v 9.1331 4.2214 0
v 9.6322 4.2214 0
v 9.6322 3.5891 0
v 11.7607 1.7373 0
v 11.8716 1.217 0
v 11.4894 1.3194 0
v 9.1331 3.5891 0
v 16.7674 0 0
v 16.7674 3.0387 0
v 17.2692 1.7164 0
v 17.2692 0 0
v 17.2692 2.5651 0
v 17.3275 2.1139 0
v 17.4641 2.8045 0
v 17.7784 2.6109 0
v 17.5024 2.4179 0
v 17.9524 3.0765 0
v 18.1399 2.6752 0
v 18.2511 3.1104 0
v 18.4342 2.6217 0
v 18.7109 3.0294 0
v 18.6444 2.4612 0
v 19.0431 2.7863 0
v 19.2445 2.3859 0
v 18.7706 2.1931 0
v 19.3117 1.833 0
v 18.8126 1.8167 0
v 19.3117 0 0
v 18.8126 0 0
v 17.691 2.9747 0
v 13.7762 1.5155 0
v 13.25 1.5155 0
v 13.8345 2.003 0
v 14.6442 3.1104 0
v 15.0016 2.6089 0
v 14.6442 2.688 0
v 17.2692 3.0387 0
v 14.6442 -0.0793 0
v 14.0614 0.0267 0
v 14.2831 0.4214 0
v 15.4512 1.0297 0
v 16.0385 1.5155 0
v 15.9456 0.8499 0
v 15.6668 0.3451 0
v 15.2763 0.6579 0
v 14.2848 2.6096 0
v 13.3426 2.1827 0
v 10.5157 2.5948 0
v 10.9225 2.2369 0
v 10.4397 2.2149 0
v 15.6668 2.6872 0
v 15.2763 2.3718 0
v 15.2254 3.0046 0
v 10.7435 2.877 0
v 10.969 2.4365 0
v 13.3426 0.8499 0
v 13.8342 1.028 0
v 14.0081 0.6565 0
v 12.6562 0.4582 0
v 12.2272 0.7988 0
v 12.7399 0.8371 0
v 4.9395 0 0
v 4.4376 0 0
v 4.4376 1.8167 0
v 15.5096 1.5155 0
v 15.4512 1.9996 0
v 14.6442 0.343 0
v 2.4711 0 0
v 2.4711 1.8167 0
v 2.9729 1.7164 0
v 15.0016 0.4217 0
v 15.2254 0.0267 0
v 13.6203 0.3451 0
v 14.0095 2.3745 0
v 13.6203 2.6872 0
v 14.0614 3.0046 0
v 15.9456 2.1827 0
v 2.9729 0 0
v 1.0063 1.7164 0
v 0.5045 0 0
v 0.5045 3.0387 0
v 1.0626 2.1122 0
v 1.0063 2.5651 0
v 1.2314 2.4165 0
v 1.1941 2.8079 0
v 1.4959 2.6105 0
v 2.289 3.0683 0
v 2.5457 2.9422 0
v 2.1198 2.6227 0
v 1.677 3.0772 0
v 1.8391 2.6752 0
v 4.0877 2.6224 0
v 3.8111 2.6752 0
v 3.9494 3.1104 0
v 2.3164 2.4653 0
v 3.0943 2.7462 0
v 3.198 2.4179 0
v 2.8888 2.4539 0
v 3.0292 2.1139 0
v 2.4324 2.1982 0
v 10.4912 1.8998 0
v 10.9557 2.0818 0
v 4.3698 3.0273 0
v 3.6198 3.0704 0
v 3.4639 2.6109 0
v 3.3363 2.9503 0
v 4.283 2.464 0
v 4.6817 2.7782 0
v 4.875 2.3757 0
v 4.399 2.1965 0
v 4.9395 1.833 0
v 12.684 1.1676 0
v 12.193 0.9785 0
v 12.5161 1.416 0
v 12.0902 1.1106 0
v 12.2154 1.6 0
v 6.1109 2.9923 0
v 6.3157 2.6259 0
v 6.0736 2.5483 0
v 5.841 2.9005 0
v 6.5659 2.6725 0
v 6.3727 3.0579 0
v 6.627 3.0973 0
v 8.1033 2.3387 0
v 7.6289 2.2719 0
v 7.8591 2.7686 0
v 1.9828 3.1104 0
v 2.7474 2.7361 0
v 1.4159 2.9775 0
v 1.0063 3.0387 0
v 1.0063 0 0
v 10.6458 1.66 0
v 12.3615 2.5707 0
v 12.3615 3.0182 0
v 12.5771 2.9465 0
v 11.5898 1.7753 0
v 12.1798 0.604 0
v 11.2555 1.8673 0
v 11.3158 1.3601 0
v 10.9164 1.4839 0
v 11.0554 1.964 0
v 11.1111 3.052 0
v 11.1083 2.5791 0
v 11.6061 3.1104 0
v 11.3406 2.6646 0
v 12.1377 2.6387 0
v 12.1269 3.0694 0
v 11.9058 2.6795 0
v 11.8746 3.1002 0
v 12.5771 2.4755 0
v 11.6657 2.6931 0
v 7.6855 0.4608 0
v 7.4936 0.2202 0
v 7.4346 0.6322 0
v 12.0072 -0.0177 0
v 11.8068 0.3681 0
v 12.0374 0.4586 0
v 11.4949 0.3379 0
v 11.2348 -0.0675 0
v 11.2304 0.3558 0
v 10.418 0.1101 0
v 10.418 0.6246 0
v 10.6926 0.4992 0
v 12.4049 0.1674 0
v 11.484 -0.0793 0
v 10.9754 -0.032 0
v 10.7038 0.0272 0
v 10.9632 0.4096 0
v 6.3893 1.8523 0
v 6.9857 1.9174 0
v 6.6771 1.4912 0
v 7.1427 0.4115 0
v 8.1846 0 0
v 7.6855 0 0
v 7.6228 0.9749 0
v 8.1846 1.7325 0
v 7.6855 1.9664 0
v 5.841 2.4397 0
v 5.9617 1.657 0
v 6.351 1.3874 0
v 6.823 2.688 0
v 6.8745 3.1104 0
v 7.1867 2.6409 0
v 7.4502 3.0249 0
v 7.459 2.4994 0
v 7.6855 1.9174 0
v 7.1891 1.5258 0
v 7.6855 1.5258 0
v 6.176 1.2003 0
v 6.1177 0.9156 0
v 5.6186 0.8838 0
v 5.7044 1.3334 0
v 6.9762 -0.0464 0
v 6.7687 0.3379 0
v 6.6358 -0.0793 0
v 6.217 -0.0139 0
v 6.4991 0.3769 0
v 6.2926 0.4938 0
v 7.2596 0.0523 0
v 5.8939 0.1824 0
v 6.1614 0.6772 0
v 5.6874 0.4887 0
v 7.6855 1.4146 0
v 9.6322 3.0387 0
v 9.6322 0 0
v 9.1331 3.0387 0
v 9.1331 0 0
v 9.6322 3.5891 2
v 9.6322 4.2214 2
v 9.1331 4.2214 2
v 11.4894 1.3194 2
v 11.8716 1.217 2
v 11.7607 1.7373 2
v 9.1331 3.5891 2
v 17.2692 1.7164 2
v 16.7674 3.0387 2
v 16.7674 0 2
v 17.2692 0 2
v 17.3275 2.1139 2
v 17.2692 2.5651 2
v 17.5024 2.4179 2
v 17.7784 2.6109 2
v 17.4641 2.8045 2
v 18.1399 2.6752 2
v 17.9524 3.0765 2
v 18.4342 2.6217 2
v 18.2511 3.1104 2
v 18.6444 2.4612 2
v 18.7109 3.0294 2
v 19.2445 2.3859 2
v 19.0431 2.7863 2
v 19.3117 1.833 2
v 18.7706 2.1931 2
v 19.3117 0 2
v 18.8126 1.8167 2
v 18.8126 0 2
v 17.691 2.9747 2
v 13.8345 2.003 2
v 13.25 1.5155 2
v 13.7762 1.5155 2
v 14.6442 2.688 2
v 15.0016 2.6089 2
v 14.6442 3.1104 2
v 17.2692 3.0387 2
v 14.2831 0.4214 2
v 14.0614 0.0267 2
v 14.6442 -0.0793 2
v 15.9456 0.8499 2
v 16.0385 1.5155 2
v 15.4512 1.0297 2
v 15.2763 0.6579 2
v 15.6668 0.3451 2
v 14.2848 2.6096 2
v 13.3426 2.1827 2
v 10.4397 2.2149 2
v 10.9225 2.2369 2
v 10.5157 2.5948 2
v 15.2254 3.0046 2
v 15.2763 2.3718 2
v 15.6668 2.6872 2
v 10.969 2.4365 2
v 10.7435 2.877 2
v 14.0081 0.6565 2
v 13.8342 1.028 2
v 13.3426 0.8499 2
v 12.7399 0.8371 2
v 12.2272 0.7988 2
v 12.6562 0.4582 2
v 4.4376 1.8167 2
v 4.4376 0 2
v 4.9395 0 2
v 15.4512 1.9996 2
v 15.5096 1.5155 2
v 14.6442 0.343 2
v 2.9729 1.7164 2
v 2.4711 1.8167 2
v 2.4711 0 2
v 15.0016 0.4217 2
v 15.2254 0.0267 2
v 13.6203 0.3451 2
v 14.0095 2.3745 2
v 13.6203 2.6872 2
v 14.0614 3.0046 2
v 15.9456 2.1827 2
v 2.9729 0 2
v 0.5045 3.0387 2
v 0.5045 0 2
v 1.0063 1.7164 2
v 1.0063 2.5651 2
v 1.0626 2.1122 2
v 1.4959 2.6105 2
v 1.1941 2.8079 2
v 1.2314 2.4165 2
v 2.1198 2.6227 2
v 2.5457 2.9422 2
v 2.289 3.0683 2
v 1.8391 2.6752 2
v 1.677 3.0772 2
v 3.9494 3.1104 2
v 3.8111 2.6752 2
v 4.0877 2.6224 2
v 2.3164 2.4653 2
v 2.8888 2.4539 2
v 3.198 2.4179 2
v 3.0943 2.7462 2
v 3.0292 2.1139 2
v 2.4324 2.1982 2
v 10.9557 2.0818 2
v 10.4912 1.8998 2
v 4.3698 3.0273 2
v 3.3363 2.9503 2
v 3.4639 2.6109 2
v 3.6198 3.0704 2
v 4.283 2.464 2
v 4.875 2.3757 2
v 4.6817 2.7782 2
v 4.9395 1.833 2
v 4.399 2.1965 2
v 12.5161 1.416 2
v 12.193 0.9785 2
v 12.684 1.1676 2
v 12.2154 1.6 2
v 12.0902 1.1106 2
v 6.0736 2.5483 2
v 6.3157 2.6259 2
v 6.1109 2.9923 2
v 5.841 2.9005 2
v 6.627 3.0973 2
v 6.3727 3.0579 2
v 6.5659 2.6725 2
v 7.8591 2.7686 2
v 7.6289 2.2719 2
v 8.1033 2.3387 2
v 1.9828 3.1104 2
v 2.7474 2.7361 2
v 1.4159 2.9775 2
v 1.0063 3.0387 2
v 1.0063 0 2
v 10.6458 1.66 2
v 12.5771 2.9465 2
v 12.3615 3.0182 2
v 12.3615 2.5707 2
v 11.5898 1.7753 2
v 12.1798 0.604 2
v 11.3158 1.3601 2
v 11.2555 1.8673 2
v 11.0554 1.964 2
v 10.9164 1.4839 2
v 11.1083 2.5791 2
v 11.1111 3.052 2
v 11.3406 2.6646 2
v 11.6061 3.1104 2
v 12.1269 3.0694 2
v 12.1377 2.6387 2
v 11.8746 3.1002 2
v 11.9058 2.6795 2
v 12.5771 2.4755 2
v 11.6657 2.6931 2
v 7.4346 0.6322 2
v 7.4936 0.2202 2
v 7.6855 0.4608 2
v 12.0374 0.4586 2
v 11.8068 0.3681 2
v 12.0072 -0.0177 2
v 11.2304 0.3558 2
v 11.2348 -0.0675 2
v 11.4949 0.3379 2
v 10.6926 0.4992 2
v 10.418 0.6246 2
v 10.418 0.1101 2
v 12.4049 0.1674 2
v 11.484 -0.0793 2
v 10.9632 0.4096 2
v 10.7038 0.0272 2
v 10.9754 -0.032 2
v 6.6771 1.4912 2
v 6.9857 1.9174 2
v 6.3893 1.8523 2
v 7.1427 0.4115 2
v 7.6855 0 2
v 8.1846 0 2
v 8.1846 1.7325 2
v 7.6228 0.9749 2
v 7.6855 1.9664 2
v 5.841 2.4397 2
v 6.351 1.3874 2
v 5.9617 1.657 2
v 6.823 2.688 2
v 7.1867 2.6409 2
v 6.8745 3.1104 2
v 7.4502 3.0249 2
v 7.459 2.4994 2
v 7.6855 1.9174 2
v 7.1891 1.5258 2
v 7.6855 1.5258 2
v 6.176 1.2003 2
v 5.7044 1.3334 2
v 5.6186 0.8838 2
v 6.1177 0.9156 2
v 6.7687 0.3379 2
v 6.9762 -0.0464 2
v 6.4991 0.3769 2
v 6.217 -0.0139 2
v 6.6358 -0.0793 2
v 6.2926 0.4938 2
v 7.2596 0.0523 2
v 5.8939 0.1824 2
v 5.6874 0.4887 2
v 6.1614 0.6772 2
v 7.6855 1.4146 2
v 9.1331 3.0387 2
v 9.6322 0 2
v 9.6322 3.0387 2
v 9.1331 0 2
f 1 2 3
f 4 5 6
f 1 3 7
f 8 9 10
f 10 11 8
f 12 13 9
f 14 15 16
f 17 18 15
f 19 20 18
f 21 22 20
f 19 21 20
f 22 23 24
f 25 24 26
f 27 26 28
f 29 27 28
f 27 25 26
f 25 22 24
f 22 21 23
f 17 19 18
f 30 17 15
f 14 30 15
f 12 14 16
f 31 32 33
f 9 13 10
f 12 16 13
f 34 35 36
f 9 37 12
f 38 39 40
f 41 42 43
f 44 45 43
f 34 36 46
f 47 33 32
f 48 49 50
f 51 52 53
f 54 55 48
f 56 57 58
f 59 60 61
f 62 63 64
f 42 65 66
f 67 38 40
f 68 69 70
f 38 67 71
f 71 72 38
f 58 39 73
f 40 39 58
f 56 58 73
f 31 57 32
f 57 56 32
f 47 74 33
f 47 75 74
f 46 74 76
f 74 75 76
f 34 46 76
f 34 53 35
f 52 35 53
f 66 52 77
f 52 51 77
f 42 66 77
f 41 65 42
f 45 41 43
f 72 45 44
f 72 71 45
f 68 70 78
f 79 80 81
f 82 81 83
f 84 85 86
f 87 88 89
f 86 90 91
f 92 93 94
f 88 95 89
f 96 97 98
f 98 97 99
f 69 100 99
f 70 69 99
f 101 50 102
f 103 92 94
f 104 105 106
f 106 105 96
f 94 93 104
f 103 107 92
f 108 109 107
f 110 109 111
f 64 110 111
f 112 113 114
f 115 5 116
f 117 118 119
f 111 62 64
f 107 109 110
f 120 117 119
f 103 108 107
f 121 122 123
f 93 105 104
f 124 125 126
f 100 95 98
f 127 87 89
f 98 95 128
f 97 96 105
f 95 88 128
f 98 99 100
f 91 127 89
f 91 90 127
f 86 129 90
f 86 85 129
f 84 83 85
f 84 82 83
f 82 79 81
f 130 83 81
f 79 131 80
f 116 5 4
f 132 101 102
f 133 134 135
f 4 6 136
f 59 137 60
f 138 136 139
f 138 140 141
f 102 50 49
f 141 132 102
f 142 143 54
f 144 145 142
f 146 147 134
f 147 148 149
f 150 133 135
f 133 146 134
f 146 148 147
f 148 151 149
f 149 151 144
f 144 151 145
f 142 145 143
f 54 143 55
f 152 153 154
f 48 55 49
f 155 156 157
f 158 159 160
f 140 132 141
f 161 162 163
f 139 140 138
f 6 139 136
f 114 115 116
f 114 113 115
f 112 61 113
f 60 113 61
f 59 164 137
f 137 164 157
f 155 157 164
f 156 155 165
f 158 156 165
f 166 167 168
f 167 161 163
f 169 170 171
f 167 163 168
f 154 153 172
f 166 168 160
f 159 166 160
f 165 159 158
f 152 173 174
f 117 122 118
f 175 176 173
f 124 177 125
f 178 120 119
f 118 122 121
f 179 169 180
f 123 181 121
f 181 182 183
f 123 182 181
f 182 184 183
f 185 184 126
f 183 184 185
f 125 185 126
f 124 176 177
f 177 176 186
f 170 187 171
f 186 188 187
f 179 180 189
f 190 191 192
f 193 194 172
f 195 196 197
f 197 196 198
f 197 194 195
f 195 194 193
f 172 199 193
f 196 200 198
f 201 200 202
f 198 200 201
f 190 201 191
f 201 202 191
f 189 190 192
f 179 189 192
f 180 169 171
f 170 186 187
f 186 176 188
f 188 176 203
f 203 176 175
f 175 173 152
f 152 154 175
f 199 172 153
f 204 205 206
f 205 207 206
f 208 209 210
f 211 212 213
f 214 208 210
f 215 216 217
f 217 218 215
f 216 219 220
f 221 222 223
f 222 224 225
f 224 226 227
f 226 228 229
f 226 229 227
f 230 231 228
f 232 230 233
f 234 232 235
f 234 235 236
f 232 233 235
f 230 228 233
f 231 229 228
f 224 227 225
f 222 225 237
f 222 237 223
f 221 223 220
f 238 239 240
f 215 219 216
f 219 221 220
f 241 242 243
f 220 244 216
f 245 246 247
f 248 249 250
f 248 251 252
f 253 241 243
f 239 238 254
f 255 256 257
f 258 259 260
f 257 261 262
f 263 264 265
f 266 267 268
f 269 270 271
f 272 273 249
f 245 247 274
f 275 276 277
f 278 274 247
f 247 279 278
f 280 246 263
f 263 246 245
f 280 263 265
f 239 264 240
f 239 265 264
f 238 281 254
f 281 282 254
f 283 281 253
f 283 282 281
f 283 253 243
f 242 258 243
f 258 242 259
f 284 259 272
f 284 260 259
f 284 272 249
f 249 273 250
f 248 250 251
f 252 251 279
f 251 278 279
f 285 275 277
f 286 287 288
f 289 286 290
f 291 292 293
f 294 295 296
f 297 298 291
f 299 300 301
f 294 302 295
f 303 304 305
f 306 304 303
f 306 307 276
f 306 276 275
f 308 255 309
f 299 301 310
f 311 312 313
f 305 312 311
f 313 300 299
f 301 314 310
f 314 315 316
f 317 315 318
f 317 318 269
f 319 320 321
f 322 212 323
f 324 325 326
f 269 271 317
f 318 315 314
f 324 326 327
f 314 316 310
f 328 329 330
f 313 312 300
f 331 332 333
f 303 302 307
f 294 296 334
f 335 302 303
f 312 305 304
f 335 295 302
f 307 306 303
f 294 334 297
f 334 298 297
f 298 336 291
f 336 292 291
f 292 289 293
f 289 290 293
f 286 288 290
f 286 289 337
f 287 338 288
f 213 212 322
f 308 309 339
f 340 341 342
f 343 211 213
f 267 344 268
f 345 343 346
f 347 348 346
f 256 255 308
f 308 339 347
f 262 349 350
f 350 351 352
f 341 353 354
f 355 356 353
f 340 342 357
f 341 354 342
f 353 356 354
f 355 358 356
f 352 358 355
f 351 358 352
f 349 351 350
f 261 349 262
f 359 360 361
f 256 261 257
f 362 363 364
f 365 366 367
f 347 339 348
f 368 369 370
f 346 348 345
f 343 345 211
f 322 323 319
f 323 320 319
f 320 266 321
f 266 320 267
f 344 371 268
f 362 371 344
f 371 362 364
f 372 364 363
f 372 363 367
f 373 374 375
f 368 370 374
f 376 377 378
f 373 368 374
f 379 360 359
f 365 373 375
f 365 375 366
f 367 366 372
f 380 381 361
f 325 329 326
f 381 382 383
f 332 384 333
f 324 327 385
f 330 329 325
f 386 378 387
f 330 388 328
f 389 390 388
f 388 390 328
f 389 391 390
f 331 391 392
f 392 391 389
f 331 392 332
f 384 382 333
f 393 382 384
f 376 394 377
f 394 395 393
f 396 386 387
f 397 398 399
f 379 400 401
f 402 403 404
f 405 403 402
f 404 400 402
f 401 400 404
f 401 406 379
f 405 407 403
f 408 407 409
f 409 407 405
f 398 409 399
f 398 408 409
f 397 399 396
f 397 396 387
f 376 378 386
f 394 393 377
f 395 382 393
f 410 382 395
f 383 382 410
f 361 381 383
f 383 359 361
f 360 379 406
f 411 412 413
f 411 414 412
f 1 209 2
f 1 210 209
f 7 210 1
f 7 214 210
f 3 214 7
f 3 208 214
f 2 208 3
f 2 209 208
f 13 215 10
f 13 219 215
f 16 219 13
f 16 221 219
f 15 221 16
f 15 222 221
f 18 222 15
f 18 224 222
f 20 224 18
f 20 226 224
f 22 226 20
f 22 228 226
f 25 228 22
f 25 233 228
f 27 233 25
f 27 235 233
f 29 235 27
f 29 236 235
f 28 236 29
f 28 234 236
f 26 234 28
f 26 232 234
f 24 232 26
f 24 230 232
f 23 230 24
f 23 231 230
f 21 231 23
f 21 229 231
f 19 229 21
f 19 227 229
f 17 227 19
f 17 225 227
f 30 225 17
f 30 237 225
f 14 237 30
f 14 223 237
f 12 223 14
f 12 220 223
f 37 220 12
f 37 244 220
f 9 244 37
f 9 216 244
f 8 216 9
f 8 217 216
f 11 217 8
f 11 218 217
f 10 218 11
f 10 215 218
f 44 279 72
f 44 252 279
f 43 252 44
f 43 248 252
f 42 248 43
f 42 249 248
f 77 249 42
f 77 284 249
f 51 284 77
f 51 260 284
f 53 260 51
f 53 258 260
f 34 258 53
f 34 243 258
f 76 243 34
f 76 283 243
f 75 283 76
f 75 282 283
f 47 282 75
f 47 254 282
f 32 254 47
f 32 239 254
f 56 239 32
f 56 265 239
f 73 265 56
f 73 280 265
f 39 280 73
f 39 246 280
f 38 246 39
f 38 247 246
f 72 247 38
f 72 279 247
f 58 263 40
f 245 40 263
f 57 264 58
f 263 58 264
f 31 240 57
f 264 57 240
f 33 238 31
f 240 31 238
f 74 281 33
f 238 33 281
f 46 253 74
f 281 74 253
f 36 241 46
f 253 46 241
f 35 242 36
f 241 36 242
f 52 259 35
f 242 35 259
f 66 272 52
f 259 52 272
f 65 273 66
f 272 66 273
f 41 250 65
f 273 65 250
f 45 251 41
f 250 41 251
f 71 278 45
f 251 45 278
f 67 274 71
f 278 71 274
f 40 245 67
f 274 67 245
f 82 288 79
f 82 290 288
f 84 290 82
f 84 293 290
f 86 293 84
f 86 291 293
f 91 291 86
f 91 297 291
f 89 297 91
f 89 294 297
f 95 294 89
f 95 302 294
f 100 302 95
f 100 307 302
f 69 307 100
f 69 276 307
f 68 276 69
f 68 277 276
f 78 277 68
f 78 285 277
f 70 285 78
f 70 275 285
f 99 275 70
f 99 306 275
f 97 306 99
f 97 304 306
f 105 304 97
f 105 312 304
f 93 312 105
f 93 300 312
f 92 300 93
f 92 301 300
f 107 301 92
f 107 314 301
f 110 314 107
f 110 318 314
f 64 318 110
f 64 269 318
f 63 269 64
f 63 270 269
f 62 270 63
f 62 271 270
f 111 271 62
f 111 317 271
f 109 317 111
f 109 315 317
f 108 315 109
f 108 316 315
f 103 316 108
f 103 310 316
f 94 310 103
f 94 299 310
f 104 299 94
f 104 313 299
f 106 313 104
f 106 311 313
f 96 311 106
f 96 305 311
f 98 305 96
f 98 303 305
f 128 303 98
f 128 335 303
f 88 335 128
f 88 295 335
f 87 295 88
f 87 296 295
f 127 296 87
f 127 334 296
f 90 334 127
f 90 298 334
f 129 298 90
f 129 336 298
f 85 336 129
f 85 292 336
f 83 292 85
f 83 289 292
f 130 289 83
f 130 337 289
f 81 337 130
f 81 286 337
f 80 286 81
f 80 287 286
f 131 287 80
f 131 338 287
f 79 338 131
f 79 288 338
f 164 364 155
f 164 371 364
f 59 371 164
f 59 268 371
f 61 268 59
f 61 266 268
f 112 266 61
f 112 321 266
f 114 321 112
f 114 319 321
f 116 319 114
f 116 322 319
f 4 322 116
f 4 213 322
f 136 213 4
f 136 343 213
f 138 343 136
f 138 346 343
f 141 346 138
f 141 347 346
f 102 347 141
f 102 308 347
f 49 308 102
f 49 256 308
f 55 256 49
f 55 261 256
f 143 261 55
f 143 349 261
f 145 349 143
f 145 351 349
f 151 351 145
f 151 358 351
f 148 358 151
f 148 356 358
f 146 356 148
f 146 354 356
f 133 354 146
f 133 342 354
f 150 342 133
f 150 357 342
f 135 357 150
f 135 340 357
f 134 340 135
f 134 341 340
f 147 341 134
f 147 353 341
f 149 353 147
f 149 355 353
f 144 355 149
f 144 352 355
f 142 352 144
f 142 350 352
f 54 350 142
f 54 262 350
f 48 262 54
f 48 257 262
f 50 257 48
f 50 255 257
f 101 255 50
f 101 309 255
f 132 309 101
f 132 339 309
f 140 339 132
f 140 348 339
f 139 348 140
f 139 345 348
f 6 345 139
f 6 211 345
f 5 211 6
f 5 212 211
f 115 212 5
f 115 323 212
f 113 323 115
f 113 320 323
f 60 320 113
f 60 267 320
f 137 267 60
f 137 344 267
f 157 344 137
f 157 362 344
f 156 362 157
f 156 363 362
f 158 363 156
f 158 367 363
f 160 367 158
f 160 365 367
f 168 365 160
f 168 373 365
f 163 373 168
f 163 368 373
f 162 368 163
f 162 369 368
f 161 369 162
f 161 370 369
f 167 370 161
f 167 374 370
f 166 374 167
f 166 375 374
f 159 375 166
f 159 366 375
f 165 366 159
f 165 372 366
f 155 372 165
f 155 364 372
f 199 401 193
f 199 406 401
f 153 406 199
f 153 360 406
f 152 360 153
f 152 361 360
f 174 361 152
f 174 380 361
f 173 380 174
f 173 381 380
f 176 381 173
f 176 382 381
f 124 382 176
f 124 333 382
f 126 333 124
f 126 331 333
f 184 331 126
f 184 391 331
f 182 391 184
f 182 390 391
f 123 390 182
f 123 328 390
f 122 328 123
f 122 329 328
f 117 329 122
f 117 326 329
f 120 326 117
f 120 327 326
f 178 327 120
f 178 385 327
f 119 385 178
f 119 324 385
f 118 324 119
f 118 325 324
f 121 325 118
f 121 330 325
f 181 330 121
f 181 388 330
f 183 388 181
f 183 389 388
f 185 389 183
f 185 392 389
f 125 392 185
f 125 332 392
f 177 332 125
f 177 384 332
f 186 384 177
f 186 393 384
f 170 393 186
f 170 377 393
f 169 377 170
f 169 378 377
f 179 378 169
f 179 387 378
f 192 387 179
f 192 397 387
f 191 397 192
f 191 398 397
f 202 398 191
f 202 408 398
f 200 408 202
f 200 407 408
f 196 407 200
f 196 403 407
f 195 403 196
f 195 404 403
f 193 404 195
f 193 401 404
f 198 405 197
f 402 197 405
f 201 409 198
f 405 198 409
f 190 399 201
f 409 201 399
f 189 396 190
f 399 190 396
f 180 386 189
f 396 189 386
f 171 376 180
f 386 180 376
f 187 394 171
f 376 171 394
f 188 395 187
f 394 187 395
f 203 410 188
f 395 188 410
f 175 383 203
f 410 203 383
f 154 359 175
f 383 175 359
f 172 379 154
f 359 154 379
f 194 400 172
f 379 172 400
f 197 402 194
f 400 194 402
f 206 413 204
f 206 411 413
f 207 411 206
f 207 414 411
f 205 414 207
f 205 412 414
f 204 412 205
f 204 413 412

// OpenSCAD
texte_a_inserer = "maison"; 
taille = 4; 
police = "DejaVuSans"; //[[Abril Fatface,Aclonica,Acme,Advent Pro,Akronim,Aladin,Alegreya,Alegreya Sans,Alegreya SC,Alex Brush,Alfa Slab One,Alice,Amaranth,Architects Daughter,Archivo Black,Archivo Narrow,Arimo,Arvo,Asap,Astloch,Asul,Averia Libre,Averia Serif Libre,Bangers,Basic,Belgrano,Berkshire Swash,Bigshot One,Bilbo Swash Caps,Black Ops One,Bonbon,Bowlby One SC,Brawler,Bubblegum Sans,Butterfly Kids,Cabin Condensed,Caesar Dressing,Cagliostro,Calligraffitti,Capriola,Carter One,Changa One,Chango,Chelsea Market,Cherry Cream Soda,Chewy,Chicle,Chivo,Clicker Script,Coming Soon,Concert One,Condiment,Cookie,Courgette,Covered By Your Grace,Crimson Text,Dancing Script,DejaVu Sans,DejaVu Serif,Dhurjati,Doppio One,Dosis,Droid Sans,Eagle Lake,Electrolize,Emilys Candy,Encode Sans,Encode Sans Compressed,Euphoria Script,Exo,Exo 2,Faster One,Federo,Finger Paint,Fjord One,Fontdiner Swanky,Freckle Face,Fruktur,Gabriela,Geo,Germania One,Give You Glory,Gloria Hallelujah,Goudy Bookletter 1911,Graduate,Grand Hotel,Great Vibes,Griffy,Hanalei Fill,Happy Monkey,Henny Penny,Hind,IM Fell English SC,Indie Flower,Irish Grover,Italianno,Jacques Francois Shadow,Jolly Lodger,Josefin Slab,Joti One,Judson,Just Another Hand,Kalam,Kameron,Karma,Kavoon,Knewave,Kranky,Kristi,Laila,Lakki Reddy,Lancelot,Lato,Leckerli One,Ledger,Lekton,Lemon One,Liberation Sans,Libre Caslon Text,Life Savers,Lilita One,Lily Script One,Limelight,Lobster,Lobster Two,Londrina Outline,Londrina Shadow,Londrina Solid,Lora,Love Ya Like A Sister,Loved by the King,Lovers Quarrel,Luckiest Guy,Lusitana,Macondo,Macondo Swash Caps,Mako,Marck Script,Margarine,Marko One,Maven Pro,McLaren,MedievalSharp,Merienda One,Merriweather,Mervale Script,Metal Mania,Metrophobic,Milonga,Miltonian Tattoo,Miss Fajardose,Molle,Montez,Montserrat,Mr De Haviland,Mystery Quest,Neucha,New Rocker,Niconne,Nosifer,Nothing You Could Do,Noto Sans Oriya,Noto Serif,Nova Square,Nunito,Old Standard TT,Oleo Script,Oleo Script Swash Caps,Orbitron,Oregano,Orienta,Original Surfer,Oswald,Over the Rainbow,Overlock,Oxygen,Pacifico,Paprika,Parisienne,Patrick Hand SC,Paytone One,Peralta,Permanent Marker,Piedra,Pirata One,Play,Playball,Poetsen One,Poppins,Press Start 2P,Princess Sofia,PT Mono,Qwigley,Racing Sans One,Raleway,Rancho,Ranga,Ribeye,Roboto,Roboto Condensed,Roboto Slab,Rochester,Rock Salt,Rubik One,Sail,Salsa,Sansita One,Sarina,Satisfy,Schoolbell,Seaweed Script,Sevillana,Shadows Into Light,Shadows Into Light Two,Share,Six Caps,Skranji,Source Sans Pro,Spicy Rice,Stardos Stencil,Stoke,Syncopate,Teko,Terminal Dosis,The Girl Next Door,Tillana,Timmana,Titillium Web,Ubuntu,Ultra,Underdog,UnifrakturCook,UnifrakturMaguntia,Vampiro One,Vidaloka,Viga,Voces,Volkhov,Vollkorn,Voltaire,Waiting for the Sunrise,Wallpoet,Wellfleet,Wendy One,Yellowtail,Yesteryear,Zeyada]]
hauteur = 2; 
module rendu(){
linear_extrude(hauteur) text(texte_a_inserer,size = taille, font = police);
}
rendu();
 
